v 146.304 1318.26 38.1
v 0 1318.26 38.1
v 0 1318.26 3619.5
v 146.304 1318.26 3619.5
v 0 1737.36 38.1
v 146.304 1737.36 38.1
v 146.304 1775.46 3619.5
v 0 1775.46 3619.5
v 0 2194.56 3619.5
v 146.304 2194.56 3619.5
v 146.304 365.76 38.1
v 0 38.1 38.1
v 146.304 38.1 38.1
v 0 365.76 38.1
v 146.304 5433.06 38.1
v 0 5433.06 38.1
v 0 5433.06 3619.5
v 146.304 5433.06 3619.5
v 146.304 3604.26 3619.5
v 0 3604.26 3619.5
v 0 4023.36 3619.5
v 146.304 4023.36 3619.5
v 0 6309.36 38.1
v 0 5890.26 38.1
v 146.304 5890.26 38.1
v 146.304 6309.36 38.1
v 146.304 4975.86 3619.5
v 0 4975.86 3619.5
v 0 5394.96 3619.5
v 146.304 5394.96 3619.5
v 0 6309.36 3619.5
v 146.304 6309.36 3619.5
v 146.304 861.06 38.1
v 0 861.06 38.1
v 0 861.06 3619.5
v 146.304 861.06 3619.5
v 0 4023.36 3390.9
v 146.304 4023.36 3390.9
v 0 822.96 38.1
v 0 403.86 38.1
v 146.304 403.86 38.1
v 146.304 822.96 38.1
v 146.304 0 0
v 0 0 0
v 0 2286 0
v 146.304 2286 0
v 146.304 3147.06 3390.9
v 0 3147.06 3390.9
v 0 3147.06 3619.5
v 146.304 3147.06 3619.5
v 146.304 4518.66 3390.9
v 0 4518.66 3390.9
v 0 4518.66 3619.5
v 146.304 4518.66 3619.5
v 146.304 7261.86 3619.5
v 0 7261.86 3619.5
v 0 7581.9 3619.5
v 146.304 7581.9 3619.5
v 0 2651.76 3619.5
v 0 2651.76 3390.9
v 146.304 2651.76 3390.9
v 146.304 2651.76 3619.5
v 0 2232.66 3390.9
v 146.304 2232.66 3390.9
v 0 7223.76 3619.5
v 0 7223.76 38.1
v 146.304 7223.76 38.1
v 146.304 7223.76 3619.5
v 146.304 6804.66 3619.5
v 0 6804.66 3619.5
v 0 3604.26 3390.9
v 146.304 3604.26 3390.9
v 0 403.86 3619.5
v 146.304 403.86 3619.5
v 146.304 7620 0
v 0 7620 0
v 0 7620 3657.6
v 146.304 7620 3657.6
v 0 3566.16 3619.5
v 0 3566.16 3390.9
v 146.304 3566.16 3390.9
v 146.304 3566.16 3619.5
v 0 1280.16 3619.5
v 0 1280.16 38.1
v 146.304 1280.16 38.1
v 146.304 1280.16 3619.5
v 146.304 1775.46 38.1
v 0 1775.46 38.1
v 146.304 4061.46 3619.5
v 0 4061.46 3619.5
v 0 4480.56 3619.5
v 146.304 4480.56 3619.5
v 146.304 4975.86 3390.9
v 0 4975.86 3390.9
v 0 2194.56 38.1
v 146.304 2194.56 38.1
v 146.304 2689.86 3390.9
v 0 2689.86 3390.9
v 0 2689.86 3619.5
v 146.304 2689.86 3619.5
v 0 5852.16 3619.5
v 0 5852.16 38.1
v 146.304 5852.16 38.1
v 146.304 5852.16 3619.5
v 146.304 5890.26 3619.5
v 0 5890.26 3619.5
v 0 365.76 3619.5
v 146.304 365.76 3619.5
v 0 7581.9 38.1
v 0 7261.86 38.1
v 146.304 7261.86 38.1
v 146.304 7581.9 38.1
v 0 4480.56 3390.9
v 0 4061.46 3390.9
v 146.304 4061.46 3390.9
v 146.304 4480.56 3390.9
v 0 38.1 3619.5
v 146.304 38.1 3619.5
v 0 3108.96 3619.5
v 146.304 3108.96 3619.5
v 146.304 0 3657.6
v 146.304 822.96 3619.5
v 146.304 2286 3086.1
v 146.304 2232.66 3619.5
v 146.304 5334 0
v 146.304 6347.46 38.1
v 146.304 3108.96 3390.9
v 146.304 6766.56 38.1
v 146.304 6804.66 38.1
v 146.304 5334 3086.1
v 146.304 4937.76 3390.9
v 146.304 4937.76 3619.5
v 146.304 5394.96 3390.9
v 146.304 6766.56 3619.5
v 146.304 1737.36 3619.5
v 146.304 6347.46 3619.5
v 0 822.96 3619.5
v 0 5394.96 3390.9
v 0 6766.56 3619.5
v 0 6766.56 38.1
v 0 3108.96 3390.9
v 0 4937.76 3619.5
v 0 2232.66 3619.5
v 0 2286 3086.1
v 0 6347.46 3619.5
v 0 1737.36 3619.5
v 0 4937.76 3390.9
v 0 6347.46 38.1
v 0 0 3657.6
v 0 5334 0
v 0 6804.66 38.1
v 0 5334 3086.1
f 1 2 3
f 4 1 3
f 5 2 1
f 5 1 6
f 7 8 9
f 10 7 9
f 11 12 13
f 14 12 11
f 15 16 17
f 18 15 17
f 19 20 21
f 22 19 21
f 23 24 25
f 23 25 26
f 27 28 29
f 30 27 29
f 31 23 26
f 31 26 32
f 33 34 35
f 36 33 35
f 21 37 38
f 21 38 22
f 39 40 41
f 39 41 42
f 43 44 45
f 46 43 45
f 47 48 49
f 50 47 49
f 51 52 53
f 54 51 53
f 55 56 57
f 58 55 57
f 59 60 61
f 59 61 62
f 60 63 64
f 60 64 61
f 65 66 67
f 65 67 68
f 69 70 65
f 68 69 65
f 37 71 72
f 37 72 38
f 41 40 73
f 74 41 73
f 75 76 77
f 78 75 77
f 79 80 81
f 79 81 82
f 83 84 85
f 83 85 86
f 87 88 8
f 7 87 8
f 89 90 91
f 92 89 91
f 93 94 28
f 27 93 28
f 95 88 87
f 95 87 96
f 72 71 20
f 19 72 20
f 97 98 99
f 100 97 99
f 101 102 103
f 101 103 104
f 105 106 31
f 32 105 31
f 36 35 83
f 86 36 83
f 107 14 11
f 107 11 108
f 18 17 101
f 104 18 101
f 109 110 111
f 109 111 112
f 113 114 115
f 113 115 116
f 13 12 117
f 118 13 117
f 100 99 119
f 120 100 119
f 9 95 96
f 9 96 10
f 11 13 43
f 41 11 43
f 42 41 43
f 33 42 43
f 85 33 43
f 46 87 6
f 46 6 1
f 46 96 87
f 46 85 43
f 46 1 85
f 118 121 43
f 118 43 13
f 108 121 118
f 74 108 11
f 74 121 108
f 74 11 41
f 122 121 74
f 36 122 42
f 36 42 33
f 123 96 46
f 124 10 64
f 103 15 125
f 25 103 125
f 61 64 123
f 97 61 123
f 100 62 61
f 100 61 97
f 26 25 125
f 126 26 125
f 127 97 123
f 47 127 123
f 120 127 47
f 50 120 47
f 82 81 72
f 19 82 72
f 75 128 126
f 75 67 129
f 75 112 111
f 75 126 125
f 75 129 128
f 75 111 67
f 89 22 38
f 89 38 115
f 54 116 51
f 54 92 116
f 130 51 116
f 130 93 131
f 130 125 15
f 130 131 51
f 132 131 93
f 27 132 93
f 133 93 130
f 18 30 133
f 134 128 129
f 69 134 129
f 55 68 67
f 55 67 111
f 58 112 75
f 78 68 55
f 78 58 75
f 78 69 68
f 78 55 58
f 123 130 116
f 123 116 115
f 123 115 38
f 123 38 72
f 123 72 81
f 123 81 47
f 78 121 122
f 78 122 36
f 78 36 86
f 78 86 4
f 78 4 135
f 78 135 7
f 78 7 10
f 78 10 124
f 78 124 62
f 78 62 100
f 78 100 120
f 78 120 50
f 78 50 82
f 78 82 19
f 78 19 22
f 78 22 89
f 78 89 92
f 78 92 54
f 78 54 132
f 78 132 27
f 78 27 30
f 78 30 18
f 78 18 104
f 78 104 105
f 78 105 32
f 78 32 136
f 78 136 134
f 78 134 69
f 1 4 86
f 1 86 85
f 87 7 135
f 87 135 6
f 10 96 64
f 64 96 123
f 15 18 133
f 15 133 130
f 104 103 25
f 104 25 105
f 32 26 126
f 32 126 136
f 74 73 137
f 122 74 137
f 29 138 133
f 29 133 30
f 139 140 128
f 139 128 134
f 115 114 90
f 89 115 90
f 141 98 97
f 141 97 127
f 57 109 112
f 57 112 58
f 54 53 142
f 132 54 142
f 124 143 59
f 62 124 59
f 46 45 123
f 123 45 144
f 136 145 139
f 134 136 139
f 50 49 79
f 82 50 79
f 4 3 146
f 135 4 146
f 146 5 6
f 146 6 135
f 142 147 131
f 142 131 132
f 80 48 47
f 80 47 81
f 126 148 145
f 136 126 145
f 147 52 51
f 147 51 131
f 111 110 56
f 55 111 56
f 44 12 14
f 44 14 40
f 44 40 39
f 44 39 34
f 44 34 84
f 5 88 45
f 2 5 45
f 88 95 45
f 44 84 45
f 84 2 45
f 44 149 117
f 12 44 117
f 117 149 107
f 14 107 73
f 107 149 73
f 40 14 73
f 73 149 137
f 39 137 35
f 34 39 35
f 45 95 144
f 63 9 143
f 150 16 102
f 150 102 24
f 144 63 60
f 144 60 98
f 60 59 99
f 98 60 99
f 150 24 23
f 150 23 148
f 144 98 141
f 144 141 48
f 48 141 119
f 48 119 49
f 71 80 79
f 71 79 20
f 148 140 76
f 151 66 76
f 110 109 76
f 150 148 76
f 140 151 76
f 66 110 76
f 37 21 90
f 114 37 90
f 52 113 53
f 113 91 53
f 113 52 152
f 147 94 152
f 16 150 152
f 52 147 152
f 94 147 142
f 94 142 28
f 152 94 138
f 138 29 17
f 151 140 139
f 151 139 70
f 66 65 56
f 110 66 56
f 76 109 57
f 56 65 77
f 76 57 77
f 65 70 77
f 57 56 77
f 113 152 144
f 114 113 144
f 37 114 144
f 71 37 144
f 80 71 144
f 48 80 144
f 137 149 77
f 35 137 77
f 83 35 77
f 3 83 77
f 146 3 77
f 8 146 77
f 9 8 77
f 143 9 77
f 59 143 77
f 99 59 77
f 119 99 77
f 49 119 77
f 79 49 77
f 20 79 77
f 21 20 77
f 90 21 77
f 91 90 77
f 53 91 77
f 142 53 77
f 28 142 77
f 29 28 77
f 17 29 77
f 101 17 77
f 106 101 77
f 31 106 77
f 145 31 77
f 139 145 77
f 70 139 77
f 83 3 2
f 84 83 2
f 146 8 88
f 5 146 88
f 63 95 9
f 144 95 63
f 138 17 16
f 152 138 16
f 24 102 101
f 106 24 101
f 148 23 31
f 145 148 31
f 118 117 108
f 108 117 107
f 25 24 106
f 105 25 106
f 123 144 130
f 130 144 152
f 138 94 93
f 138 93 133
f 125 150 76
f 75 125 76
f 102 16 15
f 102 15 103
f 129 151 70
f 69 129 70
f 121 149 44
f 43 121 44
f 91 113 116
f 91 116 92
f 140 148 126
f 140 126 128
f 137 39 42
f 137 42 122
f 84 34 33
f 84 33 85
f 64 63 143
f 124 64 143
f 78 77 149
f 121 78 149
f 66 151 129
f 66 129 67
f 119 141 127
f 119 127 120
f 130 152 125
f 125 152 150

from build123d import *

# Parameters (mm, degrees)
F0_W     = 327.66
F0_H     = 3581.4
F0_W_2   = 419.1
F0_H_2   = 228.6
F0_W_3   = 320.04
F1_DEPTH = 146.304


with BuildPart() as f1:
    # F0 (on Right) → F1 (new body)
    with BuildSketch(Plane.YZ):
        Polygon((0, 3657.6), (0, 0), (2286, 0), (2286, 38.1), (2286, 3086.1), (5334, 3086.1), (5334, 38.1), (5334, 0), (7620, 0), (7620, 3657.6), align=None)
        with Locations((201.93, 1828.8)):
            Rectangle(F0_W, F0_H, mode=Mode.SUBTRACT)
        with Locations((613.41, 1828.8)):
            Rectangle(F0_W_2, F0_H, mode=Mode.SUBTRACT)
        with Locations((1070.61, 1828.8)):
            Rectangle(F0_W_2, F0_H, mode=Mode.SUBTRACT)
        with Locations((1527.81, 1828.8)):
            Rectangle(F0_W_2, F0_H, mode=Mode.SUBTRACT)
        with Locations((1985.01, 1828.8)):
            Rectangle(F0_W_2, F0_H, mode=Mode.SUBTRACT)
        with Locations((2442.21, 3505.2)):
            Rectangle(F0_W_2, F0_H_2, mode=Mode.SUBTRACT)
        with Locations((2899.41, 3505.2)):
            Rectangle(F0_W_2, F0_H_2, mode=Mode.SUBTRACT)
        with Locations((3356.61, 3505.2)):
            Rectangle(F0_W_2, F0_H_2, mode=Mode.SUBTRACT)
        with Locations((5642.61, 1828.8)):
            Rectangle(F0_W_2, F0_H, mode=Mode.SUBTRACT)
        with Locations((6099.81, 1828.8)):
            Rectangle(F0_W_2, F0_H, mode=Mode.SUBTRACT)
        with Locations((6557.01, 1828.8)):
            Rectangle(F0_W_2, F0_H, mode=Mode.SUBTRACT)
        with Locations((7014.21, 1828.8)):
            Rectangle(F0_W_2, F0_H, mode=Mode.SUBTRACT)
        with Locations((7421.88, 1828.8)):
            Rectangle(F0_W_3, F0_H, mode=Mode.SUBTRACT)
        with Locations((3813.81, 3505.2)):
            Rectangle(F0_W_2, F0_H_2, mode=Mode.SUBTRACT)
        with Locations((4271.01, 3505.2)):
            Rectangle(F0_W_2, F0_H_2, mode=Mode.SUBTRACT)
        with Locations((4728.21, 3505.2)):
            Rectangle(F0_W_2, F0_H_2, mode=Mode.SUBTRACT)
        with Locations((5185.41, 3505.2)):
            Rectangle(F0_W_2, F0_H_2, mode=Mode.SUBTRACT)
    extrude(amount=F1_DEPTH)


solid = f1.part
